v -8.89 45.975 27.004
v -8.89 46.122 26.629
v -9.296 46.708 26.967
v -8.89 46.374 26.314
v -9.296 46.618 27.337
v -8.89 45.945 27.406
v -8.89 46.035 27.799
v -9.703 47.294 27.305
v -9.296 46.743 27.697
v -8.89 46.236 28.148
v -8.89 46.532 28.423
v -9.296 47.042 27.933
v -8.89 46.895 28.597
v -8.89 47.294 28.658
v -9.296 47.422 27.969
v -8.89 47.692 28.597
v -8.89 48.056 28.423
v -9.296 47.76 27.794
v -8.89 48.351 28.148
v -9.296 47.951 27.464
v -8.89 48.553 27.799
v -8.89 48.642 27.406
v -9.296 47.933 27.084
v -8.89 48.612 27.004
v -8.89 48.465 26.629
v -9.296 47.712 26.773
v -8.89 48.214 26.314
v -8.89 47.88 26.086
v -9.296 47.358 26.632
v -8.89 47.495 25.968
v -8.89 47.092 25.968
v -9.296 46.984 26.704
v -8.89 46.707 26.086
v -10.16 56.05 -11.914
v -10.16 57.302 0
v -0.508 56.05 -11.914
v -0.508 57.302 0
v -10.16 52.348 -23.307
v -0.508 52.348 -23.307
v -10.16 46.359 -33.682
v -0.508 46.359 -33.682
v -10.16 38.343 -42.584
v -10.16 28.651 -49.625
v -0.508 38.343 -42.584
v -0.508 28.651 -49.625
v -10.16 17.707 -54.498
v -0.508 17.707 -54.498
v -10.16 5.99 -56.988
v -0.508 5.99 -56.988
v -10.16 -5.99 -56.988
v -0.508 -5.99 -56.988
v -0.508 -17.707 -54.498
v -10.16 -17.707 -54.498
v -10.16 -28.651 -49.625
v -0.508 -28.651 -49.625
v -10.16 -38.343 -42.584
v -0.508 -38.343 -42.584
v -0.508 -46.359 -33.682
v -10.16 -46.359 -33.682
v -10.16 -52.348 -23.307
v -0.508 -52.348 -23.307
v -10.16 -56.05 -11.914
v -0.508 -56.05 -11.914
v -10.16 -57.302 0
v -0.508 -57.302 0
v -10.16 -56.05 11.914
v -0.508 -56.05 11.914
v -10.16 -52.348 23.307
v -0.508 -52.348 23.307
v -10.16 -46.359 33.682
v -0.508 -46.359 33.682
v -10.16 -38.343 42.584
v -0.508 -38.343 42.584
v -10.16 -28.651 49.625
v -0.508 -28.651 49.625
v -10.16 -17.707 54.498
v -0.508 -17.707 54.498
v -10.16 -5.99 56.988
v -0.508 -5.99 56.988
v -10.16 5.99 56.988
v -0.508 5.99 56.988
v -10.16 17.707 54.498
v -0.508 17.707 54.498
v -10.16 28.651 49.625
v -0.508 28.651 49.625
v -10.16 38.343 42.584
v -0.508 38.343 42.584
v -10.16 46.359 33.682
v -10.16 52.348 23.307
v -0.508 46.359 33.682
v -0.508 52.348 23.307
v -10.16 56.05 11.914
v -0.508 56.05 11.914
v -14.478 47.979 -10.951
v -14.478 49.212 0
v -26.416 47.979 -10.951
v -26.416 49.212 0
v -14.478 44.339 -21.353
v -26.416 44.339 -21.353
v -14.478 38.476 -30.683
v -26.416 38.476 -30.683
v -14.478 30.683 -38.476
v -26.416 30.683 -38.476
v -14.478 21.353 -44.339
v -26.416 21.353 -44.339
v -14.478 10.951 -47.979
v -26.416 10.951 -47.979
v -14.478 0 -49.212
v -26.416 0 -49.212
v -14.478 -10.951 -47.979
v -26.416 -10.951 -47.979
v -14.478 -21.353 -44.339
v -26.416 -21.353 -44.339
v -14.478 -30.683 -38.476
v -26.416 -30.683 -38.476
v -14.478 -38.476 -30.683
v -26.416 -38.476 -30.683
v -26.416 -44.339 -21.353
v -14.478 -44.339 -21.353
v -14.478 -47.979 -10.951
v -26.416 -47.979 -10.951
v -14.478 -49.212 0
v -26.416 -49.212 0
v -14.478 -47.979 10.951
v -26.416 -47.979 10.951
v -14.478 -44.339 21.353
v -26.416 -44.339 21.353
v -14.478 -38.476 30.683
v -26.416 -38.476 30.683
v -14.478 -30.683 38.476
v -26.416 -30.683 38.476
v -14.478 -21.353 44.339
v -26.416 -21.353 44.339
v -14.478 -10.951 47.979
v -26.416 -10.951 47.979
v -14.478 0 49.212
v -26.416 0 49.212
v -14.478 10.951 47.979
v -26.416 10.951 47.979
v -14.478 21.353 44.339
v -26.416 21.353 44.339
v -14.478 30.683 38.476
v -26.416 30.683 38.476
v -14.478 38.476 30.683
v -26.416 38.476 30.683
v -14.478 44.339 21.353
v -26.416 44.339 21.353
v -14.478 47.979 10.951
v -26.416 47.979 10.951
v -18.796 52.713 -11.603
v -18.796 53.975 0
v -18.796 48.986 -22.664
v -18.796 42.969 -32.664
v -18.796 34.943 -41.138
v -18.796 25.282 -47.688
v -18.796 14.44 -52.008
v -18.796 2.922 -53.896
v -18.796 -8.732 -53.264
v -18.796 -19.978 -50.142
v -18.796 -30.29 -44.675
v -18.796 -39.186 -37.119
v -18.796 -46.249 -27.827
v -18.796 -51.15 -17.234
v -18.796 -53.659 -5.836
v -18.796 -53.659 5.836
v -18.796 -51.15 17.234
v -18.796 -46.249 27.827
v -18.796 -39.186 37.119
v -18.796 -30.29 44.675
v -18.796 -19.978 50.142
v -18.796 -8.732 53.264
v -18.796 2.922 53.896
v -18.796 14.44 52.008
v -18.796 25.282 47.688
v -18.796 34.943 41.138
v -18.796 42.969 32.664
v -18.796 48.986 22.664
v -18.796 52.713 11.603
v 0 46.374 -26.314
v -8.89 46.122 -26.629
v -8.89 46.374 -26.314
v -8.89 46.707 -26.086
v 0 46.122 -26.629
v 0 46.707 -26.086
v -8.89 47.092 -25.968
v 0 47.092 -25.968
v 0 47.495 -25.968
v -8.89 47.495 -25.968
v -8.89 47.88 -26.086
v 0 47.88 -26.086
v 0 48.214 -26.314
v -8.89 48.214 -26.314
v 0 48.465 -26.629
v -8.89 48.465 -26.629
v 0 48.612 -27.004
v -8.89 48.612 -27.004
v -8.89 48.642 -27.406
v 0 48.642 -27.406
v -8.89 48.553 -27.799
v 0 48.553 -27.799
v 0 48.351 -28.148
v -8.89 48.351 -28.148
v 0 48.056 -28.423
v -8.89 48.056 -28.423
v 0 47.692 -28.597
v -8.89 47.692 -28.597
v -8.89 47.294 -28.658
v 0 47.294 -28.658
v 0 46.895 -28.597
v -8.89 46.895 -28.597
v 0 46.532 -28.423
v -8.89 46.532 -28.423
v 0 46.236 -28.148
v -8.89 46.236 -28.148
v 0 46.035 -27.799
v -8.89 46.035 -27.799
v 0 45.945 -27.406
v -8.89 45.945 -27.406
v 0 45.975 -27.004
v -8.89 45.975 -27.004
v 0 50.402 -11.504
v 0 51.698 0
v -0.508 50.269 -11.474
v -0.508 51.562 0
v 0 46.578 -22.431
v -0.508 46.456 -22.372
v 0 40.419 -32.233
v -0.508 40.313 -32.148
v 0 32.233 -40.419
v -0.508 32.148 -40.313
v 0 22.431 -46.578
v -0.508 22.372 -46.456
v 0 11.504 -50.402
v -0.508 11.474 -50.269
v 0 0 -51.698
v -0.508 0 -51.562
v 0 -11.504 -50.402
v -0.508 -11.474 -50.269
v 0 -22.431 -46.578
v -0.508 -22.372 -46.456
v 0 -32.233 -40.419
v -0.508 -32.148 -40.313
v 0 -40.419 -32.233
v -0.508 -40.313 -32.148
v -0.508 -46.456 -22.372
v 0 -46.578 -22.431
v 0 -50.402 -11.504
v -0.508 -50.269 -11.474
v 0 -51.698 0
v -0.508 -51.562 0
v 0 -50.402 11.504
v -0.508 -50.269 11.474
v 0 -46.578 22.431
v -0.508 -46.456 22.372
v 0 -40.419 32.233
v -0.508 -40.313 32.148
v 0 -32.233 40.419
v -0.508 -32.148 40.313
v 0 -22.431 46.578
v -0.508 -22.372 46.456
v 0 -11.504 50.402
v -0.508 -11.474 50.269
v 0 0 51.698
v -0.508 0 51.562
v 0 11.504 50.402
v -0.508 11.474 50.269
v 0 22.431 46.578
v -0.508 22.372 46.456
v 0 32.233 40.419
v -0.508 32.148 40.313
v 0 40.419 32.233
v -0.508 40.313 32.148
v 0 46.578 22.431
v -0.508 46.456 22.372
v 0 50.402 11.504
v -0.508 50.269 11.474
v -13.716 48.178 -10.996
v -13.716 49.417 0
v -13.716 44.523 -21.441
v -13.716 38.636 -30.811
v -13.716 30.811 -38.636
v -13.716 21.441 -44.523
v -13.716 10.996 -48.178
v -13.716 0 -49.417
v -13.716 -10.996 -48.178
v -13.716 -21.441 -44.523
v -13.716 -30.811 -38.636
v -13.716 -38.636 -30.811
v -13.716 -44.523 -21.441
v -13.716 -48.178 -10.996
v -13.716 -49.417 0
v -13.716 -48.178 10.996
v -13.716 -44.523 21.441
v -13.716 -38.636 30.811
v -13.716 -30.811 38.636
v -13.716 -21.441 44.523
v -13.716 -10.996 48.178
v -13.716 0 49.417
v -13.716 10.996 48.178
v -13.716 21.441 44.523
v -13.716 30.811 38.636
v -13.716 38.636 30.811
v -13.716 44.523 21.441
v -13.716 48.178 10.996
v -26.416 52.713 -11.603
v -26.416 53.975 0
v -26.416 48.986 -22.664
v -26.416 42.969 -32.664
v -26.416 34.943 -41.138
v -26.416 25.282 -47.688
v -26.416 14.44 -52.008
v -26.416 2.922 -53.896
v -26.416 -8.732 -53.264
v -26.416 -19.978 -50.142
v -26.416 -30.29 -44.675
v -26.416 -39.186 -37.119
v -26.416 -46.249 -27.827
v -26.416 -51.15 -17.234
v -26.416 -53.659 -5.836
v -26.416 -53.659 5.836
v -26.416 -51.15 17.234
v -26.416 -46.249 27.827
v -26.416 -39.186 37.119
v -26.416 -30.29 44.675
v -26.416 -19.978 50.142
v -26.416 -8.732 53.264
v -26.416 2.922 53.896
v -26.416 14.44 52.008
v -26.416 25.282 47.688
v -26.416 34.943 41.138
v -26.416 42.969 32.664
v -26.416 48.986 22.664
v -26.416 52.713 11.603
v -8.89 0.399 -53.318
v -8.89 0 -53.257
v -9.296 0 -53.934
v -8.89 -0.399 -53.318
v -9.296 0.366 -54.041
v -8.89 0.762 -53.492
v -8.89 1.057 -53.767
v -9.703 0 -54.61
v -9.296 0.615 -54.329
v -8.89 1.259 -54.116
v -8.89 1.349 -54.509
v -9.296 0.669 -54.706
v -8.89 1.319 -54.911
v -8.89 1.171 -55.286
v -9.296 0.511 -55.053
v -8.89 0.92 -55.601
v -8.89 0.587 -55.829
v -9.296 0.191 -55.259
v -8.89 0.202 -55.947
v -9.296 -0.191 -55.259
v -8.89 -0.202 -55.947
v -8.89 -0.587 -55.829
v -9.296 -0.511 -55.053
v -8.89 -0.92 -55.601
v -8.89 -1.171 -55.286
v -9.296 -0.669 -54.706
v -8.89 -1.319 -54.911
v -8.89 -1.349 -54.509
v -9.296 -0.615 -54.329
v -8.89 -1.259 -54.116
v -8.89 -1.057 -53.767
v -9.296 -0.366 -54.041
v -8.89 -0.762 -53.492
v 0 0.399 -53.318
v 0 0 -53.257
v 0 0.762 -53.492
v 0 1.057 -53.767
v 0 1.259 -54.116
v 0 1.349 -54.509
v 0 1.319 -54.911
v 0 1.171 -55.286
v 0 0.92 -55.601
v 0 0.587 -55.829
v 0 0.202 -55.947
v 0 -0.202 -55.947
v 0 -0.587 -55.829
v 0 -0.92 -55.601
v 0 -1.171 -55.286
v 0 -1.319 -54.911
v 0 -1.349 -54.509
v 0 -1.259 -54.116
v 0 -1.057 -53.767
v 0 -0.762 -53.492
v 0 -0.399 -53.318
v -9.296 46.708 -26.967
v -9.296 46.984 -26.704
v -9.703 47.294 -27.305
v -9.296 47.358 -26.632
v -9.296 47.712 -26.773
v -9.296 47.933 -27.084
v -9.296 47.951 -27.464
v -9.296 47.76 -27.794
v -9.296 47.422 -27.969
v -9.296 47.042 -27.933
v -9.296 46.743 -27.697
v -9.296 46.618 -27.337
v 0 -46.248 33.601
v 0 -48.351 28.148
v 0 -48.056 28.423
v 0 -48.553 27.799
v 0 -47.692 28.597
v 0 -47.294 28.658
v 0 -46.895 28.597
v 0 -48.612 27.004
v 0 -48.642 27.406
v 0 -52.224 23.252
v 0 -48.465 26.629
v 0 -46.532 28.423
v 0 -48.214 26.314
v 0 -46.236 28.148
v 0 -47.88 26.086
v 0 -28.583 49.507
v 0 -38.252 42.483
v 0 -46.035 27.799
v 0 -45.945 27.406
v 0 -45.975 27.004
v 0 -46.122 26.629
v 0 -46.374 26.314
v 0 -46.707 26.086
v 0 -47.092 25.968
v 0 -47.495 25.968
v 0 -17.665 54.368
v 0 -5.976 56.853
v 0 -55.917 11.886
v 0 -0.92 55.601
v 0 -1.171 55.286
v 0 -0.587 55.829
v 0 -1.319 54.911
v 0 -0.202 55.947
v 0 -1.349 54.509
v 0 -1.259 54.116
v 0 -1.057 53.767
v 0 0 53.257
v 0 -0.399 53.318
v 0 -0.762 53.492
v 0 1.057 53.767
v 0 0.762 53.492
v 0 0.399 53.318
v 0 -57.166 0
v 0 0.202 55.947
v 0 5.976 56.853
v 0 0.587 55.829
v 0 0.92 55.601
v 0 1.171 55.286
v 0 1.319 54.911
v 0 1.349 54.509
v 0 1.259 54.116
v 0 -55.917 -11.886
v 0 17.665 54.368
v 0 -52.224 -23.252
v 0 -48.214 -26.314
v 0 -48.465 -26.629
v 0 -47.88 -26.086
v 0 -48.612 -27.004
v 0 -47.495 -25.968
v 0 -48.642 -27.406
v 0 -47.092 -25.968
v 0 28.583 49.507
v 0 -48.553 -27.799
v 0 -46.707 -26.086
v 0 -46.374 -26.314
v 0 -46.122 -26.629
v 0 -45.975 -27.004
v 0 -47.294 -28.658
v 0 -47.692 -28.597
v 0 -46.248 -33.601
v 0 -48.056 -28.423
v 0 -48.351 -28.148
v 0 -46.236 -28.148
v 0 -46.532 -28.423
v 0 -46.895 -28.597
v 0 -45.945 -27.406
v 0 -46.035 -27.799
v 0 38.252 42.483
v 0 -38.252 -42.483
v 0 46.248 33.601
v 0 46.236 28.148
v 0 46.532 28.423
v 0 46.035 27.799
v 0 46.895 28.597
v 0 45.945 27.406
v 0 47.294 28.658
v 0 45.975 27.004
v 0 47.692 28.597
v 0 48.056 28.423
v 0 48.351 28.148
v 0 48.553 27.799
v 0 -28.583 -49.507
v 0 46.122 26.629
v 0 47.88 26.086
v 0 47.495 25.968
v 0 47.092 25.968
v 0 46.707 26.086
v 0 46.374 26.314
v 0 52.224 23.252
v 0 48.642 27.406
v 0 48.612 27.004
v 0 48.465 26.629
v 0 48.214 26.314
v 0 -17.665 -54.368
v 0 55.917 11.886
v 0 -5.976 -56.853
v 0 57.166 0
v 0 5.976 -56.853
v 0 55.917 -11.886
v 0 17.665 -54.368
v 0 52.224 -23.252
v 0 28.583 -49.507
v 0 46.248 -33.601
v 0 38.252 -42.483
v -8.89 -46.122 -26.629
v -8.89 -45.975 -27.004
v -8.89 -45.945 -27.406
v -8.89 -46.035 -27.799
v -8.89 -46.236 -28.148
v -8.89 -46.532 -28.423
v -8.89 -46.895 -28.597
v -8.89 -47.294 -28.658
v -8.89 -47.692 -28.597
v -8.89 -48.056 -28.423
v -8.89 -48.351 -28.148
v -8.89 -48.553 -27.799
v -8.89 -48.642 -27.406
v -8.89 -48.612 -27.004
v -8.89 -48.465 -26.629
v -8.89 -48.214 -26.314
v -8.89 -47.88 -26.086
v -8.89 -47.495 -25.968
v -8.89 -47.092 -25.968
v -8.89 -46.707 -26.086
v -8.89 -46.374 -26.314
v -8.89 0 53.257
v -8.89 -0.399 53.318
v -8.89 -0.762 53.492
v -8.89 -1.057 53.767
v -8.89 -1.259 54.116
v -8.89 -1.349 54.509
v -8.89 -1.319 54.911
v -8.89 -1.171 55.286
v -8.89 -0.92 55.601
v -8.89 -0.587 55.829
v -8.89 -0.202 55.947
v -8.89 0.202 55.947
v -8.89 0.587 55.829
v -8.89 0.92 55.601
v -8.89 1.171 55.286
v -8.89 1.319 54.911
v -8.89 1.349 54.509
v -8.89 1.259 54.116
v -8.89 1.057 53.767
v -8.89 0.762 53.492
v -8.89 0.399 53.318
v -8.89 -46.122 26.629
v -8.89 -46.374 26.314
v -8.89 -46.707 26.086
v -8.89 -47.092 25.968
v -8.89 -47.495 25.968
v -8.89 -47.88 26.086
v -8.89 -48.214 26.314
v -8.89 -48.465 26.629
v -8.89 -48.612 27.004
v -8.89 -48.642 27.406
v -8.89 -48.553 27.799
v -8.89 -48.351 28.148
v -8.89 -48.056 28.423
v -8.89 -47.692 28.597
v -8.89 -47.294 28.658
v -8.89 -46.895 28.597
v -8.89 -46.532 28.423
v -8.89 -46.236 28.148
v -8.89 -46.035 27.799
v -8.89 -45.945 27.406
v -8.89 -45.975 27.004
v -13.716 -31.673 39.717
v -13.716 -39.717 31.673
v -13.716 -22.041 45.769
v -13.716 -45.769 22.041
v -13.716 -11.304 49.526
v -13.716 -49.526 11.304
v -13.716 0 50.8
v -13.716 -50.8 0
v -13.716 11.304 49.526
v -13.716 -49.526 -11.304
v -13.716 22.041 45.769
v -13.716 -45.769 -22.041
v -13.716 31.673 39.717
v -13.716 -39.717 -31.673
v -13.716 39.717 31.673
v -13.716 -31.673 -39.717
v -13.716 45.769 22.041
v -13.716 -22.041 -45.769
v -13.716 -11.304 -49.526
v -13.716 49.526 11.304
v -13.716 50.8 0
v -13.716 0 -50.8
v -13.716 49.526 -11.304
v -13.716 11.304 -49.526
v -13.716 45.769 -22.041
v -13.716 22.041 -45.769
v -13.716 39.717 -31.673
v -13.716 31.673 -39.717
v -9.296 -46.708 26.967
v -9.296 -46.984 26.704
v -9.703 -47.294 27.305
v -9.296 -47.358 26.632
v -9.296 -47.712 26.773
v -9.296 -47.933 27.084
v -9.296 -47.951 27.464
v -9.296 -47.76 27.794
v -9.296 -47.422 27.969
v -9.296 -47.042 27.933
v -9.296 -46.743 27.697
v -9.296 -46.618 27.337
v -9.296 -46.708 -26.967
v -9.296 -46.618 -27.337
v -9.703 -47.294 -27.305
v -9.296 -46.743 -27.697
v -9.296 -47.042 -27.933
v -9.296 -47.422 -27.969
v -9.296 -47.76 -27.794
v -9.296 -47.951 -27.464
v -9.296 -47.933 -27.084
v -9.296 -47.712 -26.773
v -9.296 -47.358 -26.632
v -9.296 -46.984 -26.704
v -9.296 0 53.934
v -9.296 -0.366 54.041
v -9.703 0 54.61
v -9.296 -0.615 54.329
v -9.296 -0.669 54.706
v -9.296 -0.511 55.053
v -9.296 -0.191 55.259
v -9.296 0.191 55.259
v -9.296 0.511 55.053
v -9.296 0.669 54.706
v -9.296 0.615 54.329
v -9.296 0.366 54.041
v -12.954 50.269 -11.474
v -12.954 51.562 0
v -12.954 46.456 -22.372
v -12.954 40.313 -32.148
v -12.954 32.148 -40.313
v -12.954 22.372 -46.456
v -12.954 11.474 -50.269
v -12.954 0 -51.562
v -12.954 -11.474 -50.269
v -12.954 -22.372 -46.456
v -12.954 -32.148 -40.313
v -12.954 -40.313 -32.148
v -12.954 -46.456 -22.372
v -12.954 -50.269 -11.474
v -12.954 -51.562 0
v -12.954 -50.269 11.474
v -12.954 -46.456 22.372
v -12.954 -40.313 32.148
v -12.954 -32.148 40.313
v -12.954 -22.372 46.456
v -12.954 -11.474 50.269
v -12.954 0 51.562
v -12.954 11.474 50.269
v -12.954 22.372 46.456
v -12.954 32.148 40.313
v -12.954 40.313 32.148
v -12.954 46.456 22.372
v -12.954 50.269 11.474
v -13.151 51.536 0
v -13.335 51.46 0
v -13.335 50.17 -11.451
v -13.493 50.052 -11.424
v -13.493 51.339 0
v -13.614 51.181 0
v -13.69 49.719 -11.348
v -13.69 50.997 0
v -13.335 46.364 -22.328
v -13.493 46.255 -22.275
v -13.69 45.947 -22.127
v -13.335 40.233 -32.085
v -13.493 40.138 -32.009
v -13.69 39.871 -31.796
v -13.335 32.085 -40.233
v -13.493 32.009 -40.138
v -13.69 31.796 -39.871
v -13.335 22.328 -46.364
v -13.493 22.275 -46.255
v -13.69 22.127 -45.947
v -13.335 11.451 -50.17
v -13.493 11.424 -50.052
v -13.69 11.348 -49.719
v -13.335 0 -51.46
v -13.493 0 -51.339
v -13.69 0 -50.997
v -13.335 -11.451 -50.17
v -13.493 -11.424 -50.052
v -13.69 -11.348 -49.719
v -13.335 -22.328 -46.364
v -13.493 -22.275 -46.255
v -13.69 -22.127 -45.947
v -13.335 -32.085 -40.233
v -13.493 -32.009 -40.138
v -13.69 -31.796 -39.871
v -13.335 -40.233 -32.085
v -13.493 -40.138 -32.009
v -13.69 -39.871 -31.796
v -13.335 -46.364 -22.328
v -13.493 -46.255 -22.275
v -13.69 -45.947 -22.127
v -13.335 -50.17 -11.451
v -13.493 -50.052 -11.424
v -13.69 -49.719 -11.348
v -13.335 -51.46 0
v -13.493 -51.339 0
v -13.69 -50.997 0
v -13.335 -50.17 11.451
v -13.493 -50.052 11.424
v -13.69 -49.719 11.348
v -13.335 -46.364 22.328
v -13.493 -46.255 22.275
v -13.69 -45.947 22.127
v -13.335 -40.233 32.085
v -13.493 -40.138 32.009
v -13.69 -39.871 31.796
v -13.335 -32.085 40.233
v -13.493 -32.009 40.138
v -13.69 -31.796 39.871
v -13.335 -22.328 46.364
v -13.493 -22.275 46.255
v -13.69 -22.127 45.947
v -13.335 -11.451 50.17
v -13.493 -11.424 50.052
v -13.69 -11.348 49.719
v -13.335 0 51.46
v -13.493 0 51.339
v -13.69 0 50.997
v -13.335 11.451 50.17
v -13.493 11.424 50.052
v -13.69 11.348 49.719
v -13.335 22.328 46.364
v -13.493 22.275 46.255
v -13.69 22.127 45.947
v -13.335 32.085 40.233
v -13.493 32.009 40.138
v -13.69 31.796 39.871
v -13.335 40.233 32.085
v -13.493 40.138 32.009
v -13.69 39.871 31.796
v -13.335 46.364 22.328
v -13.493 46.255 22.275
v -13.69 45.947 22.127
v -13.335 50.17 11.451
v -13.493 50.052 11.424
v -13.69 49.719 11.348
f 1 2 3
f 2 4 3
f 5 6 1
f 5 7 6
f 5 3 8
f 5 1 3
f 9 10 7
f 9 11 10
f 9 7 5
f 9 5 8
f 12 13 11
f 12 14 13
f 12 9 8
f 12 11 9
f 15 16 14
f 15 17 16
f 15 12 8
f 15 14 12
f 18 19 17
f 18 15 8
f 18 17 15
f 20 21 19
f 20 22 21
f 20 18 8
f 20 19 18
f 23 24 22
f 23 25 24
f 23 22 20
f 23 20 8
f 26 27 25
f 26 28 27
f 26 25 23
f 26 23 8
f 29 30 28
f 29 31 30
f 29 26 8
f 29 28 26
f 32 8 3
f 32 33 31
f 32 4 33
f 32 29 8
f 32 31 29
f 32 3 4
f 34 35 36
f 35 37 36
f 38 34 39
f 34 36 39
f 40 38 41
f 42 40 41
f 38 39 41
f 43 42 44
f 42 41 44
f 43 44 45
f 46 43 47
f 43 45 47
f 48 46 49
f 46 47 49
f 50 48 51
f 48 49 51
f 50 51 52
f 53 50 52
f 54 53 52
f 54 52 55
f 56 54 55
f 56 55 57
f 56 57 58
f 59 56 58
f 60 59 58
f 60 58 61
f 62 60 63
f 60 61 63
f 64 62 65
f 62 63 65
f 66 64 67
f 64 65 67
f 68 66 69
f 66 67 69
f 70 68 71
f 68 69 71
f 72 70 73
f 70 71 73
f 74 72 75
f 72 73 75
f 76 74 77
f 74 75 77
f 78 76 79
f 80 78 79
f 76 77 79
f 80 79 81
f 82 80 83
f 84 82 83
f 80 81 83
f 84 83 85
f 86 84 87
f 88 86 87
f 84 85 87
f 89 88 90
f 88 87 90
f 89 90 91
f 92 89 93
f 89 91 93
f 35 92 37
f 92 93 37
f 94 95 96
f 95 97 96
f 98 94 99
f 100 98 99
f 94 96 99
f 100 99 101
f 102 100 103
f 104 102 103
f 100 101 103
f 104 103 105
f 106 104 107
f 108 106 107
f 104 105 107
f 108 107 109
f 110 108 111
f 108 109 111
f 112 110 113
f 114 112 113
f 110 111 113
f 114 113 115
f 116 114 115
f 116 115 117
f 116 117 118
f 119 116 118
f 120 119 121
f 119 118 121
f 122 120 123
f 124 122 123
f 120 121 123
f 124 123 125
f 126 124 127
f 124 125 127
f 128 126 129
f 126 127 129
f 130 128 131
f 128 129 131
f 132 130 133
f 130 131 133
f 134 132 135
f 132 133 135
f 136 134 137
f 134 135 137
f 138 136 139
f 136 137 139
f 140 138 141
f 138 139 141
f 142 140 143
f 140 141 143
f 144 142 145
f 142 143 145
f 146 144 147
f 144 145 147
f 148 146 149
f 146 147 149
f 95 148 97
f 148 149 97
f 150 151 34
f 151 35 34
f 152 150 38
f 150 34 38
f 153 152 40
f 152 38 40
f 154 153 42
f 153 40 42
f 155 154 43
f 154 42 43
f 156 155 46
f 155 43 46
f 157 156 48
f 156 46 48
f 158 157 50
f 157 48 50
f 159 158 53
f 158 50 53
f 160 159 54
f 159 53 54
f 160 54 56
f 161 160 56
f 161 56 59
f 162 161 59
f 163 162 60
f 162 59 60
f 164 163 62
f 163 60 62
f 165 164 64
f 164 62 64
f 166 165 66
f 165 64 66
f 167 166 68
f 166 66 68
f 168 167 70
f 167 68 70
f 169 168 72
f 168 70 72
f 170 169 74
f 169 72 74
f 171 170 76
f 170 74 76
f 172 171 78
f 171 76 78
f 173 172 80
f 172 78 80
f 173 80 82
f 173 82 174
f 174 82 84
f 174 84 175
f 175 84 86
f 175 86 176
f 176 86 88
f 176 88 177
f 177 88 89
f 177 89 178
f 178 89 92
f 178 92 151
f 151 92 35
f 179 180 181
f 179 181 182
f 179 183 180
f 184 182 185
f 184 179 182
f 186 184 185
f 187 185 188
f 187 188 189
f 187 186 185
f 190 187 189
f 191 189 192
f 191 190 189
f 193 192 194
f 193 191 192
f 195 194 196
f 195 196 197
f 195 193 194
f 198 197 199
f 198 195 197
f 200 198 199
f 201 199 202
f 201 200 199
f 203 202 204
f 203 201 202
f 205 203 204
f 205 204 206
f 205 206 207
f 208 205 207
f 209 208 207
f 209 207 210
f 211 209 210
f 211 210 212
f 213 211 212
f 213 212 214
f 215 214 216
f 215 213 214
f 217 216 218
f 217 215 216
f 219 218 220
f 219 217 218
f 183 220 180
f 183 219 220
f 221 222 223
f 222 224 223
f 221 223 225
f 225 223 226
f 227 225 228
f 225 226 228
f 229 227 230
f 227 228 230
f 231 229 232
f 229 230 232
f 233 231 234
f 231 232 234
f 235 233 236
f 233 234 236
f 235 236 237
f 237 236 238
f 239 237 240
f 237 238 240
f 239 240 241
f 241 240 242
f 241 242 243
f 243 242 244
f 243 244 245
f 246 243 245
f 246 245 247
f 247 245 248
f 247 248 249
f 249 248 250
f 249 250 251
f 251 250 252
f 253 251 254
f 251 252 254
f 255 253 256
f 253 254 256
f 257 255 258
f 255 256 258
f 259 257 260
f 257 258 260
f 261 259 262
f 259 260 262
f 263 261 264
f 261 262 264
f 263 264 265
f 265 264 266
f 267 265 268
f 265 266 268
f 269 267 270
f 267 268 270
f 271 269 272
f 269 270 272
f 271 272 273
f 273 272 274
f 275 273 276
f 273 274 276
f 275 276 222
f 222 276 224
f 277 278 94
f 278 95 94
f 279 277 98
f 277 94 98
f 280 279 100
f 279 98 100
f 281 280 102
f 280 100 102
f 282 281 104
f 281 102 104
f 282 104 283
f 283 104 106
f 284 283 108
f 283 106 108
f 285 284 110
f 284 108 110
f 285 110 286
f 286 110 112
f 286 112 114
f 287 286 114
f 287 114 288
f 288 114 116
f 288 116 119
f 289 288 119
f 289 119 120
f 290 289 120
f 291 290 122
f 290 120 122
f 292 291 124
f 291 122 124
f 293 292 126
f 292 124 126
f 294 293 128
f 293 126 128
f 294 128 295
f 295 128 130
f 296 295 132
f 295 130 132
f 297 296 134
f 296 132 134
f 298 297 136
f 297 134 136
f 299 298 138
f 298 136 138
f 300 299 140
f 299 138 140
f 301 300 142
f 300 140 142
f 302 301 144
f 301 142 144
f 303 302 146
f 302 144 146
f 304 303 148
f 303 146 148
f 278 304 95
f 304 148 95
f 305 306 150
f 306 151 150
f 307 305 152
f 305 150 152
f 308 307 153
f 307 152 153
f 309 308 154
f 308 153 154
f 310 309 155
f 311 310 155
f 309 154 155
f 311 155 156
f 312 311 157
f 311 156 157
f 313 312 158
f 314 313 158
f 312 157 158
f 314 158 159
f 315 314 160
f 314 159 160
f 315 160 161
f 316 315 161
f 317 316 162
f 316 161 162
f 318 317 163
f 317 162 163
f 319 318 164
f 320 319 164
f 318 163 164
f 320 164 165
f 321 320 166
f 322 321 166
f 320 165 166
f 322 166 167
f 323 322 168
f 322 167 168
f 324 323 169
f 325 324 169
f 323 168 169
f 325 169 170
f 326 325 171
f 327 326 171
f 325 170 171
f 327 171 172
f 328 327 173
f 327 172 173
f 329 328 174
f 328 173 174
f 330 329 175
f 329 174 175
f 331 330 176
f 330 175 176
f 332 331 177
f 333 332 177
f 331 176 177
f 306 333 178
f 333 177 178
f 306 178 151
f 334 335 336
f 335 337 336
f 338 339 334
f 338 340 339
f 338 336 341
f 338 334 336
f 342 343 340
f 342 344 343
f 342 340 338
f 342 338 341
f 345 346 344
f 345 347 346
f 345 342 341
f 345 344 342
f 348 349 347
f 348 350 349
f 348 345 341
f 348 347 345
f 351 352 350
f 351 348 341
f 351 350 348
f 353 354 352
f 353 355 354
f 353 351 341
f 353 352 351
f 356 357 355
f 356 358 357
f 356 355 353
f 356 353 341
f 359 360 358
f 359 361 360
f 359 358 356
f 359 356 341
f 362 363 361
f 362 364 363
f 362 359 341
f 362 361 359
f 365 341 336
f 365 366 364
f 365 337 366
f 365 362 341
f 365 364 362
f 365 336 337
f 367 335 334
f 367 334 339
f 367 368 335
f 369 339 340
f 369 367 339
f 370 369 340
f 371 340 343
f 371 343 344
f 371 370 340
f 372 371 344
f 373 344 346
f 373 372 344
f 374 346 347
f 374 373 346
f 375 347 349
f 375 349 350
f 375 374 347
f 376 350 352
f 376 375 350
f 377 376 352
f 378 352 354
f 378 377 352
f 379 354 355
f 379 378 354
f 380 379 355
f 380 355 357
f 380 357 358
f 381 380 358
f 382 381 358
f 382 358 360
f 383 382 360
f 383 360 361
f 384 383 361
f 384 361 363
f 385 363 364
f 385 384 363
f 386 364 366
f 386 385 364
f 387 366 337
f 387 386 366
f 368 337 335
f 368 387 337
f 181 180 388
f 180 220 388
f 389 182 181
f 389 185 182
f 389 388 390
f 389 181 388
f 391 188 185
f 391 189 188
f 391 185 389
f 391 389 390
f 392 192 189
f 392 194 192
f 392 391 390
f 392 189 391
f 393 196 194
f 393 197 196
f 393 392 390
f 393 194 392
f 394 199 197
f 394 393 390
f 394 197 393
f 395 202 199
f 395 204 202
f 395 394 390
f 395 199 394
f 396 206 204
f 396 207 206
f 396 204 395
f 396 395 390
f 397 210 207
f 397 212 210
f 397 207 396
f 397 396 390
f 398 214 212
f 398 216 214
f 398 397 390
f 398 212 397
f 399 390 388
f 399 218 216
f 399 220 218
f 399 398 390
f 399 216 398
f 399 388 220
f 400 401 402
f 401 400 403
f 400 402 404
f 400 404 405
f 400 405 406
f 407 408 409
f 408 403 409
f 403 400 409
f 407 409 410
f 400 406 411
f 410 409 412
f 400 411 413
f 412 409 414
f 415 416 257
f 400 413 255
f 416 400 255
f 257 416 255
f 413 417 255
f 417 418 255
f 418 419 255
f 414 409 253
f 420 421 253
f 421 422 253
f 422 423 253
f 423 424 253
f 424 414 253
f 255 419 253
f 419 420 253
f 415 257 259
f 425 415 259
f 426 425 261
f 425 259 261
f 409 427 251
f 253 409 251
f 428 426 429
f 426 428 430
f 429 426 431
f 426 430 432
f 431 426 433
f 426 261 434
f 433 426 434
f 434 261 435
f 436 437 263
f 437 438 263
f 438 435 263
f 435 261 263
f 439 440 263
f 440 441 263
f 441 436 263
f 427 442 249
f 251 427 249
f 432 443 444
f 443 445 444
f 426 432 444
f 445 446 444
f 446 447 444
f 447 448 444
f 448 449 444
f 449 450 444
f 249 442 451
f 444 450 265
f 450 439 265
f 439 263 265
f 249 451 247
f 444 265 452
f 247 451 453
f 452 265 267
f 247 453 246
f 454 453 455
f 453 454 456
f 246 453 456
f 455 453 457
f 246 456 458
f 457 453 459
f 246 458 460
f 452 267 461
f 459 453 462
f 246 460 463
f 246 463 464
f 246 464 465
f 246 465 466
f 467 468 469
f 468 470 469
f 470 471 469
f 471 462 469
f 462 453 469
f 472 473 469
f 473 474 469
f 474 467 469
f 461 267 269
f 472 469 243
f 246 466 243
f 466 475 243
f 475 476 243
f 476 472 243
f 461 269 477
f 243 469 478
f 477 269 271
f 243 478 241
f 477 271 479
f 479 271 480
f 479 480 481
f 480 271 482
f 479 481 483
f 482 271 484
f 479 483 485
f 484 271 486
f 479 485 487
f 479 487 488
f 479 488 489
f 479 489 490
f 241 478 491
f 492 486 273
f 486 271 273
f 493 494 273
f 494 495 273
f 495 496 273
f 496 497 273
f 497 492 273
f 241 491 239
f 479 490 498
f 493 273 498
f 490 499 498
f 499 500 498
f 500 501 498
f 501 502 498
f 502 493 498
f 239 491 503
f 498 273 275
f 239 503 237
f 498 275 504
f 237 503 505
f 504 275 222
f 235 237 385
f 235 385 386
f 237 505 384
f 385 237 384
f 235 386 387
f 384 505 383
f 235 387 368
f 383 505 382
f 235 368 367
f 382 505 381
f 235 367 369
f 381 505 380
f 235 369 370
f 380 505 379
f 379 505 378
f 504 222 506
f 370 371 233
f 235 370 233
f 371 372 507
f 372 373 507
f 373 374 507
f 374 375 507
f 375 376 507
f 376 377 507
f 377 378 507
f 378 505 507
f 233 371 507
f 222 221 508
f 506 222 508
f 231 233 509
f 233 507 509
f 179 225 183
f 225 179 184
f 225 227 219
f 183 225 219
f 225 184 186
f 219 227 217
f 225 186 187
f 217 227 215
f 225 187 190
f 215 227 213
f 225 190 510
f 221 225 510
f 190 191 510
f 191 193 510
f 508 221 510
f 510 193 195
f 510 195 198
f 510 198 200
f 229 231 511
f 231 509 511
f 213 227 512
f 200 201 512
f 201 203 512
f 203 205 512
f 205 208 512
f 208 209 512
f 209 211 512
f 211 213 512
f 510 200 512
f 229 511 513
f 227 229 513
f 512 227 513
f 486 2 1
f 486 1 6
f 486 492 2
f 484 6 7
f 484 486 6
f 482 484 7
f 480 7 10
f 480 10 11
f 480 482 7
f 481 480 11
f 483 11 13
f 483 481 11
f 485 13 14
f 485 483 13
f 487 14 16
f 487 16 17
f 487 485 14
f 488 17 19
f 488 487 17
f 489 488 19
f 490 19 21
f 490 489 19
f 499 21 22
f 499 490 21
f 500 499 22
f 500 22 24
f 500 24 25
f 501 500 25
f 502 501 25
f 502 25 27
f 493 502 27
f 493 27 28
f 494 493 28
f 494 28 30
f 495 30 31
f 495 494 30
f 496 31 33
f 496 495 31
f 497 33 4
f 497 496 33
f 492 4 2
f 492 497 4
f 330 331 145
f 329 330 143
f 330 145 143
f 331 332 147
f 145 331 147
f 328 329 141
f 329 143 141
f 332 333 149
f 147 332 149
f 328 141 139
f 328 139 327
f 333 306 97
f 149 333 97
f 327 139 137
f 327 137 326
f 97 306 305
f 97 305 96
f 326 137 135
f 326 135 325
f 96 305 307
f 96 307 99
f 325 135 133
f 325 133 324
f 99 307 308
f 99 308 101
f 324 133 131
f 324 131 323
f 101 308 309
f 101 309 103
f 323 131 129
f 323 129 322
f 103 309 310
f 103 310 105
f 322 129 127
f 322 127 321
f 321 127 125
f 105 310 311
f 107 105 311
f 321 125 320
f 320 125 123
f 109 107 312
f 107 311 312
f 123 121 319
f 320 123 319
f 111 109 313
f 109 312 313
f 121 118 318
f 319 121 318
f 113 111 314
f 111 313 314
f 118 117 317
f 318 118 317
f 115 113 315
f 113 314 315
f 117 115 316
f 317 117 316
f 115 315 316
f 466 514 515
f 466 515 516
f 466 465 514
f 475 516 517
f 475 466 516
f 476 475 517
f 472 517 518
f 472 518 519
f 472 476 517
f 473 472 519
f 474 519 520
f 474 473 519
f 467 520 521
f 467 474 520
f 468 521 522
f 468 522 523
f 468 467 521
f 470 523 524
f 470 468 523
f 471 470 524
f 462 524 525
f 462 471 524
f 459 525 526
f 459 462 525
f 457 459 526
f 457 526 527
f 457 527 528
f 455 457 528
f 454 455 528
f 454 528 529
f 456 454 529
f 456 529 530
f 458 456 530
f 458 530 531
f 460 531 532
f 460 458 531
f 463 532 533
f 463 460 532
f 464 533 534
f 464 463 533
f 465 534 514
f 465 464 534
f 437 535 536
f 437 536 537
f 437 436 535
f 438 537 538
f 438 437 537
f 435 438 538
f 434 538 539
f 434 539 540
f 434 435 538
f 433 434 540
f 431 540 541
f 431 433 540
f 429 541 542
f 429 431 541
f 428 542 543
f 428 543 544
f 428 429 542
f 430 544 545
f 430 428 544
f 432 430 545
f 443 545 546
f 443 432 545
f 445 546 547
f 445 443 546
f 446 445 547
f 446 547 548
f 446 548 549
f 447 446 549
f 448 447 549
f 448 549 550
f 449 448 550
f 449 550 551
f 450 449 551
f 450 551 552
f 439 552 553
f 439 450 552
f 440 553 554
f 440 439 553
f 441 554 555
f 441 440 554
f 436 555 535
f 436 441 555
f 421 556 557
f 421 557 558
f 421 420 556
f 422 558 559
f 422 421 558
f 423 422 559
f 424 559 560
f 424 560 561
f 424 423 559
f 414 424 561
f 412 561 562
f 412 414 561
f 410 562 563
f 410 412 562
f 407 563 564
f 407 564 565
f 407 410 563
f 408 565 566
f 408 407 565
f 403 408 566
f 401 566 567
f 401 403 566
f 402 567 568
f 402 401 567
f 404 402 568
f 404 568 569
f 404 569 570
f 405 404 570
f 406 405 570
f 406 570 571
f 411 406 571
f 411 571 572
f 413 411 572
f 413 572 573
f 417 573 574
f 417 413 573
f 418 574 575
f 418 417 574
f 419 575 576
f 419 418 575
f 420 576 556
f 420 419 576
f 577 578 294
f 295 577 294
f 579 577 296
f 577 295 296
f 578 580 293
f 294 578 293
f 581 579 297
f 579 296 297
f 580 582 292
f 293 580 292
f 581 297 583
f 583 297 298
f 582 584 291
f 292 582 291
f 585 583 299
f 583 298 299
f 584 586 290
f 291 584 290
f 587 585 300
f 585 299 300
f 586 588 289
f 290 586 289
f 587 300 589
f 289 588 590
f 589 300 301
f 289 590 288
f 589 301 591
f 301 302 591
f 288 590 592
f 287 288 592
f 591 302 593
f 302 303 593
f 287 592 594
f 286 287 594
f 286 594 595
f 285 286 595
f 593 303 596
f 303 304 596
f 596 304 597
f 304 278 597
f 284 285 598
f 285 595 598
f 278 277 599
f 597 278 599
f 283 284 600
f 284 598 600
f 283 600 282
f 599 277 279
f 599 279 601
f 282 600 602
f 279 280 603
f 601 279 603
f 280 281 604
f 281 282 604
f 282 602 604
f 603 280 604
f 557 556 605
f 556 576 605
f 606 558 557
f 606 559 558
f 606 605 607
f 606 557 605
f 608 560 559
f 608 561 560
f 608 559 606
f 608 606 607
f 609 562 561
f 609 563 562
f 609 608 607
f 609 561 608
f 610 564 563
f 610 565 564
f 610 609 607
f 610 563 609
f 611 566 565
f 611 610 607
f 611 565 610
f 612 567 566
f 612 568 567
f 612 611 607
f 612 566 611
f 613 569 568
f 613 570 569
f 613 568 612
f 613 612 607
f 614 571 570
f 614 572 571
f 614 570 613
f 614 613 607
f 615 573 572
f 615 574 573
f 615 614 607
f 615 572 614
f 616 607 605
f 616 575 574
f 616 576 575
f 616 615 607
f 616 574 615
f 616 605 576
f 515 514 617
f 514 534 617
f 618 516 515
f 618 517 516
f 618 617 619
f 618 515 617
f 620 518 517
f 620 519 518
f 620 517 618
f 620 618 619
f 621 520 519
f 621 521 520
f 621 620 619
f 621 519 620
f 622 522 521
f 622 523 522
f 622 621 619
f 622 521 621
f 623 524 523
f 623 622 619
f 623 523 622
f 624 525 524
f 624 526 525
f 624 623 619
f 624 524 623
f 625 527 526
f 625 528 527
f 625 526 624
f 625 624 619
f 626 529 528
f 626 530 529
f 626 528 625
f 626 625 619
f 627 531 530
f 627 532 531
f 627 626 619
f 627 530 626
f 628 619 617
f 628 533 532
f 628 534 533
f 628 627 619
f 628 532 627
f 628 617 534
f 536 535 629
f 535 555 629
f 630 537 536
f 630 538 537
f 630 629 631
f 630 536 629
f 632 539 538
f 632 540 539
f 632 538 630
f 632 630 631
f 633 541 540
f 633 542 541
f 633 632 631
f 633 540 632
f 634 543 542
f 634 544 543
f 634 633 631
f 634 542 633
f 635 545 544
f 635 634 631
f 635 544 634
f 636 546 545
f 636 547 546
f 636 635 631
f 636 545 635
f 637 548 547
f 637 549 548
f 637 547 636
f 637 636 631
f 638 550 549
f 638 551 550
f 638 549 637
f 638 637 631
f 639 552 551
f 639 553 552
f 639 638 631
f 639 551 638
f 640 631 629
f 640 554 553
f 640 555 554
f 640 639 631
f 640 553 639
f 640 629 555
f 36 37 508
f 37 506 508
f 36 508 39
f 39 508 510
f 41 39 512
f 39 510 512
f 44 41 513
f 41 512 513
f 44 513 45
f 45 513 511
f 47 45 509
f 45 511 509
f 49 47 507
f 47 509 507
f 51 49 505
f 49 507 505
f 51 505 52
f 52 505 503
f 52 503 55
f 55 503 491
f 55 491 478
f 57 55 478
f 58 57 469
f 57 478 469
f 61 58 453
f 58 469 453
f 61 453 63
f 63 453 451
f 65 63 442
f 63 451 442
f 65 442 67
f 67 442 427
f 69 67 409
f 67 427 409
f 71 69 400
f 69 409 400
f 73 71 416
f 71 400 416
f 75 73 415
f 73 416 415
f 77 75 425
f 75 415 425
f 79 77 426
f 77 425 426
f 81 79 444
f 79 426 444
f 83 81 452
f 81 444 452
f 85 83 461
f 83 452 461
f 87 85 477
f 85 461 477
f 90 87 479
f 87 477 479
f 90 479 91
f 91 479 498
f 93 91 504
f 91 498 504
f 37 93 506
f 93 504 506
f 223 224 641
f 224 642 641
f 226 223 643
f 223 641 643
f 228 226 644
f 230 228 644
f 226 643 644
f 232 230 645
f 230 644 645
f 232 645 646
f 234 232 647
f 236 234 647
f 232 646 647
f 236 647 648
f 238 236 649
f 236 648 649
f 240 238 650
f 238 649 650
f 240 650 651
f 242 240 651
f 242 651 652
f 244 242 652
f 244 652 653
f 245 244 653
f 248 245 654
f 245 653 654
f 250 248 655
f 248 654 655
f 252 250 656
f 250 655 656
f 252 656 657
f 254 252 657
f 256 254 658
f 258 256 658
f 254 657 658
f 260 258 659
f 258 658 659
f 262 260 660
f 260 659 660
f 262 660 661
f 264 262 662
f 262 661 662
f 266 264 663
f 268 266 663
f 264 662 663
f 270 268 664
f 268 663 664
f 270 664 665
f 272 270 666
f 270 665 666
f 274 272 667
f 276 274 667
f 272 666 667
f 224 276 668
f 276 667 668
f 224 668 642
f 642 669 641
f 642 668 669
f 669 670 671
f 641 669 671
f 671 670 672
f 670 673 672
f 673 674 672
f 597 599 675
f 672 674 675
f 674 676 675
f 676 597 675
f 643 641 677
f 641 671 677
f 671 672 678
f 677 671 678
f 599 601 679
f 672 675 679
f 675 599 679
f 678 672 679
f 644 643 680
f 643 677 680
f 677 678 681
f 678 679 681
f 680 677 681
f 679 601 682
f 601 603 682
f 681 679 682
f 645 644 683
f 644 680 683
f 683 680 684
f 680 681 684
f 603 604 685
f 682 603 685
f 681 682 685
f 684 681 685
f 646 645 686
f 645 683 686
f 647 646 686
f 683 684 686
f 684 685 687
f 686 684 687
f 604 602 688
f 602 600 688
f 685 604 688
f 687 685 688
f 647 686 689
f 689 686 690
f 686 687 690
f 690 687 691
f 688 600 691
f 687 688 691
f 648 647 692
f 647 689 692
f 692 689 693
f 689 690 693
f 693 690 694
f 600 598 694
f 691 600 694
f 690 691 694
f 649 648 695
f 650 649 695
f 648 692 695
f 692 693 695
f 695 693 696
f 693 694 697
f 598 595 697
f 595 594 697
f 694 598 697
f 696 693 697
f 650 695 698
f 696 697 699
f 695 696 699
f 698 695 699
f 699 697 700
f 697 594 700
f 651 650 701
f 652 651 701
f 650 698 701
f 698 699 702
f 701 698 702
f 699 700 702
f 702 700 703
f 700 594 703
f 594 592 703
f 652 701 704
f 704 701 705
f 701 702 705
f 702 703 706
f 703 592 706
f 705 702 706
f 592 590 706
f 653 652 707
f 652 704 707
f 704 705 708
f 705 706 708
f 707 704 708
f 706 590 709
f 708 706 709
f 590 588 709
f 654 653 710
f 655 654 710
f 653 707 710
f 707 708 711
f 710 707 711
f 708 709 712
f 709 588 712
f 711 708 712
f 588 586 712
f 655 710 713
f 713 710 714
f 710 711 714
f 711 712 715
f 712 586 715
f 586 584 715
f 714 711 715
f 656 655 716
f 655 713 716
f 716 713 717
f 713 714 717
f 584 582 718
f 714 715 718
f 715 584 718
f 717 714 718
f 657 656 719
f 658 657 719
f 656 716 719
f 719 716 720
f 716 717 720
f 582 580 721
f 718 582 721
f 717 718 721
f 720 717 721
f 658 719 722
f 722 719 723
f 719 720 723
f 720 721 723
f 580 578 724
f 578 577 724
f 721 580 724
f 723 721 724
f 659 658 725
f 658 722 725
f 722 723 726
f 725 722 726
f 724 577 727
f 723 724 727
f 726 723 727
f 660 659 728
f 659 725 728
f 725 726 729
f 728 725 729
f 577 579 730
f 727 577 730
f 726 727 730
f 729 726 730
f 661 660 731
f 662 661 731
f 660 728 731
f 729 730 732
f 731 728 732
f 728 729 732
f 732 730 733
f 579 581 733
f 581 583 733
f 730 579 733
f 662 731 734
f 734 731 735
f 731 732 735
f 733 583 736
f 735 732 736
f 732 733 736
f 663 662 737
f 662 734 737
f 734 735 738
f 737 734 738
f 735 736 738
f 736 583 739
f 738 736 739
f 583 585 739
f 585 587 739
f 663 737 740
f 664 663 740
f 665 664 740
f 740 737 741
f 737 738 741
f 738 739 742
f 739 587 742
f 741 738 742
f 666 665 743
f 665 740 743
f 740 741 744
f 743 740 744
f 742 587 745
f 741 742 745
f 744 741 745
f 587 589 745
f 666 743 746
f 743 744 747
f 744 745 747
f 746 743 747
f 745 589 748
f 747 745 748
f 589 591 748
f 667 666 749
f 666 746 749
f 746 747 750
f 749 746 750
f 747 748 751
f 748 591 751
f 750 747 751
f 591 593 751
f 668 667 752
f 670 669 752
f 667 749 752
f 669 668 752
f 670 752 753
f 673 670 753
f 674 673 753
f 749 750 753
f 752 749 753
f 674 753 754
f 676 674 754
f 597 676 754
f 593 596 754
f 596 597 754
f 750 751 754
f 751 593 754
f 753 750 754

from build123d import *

# Parameters (mm, degrees)
CIRPATTERN1_COUNT = 6


with BuildPart() as part:
    # Sketch1 → Revolve1 (revolve)
    with BuildSketch(Plane.XY):
        with BuildLine():
            Line((-18.796, 53.975), (-10.16, 57.3024))
            Line((-10.16, 57.3024), (-0.508, 57.3024))
            Line((-0.508, 57.3024), (0, 57.16628181))
            Line((0, 57.16628181), (0, 51.69811819))
            Line((0, 51.69811819), (-0.508, 51.562))
            Line((-0.508, 51.562), (-12.954, 51.562))
            ThreePointArc((-12.954, 51.562), (-13.492815367, 51.338815367), (-13.716, 50.8))
            Line((-13.716, 50.8), (-13.716, 49.416677285))
            Line((-13.716, 49.416677285), (-14.478, 49.2125))
            Line((-14.478, 49.2125), (-26.416, 49.2125))
            Line((-26.416, 49.2125), (-26.416, 53.975))
            Line((-26.416, 53.975), (-18.796, 53.975))
        make_face()
    revolve(axis=Axis((0, 0, 0), (-1, 0, 0)))

    # Sketch6 → #6-32 Tapped Hole1 (revolve, cut)
    with BuildSketch(Plane(origin=(0, 0, 54.61), x_dir=(0, 0, -1), z_dir=(0, 1, 0))):
        Polygon((0, 0), (0, 9.70269403), (1.35255, 8.89), (1.35255, 0), align=None)
    f_6_32_tapped_hole1 = revolve(axis=Axis((6.35, 0, 54.61), (-1, 0, 0)), mode=Mode.SUBTRACT)

    # CirPattern1: #6-32 Tapped Hole1 ×6 about axis
    cirpattern1_axis = Axis((0, 0, 0), (1, 0, 0))
    for i in range(1, CIRPATTERN1_COUNT):
        add(f_6_32_tapped_hole1.rotate(cirpattern1_axis, i * 360 / CIRPATTERN1_COUNT), mode=Mode.SUBTRACT)


solid = part.part
